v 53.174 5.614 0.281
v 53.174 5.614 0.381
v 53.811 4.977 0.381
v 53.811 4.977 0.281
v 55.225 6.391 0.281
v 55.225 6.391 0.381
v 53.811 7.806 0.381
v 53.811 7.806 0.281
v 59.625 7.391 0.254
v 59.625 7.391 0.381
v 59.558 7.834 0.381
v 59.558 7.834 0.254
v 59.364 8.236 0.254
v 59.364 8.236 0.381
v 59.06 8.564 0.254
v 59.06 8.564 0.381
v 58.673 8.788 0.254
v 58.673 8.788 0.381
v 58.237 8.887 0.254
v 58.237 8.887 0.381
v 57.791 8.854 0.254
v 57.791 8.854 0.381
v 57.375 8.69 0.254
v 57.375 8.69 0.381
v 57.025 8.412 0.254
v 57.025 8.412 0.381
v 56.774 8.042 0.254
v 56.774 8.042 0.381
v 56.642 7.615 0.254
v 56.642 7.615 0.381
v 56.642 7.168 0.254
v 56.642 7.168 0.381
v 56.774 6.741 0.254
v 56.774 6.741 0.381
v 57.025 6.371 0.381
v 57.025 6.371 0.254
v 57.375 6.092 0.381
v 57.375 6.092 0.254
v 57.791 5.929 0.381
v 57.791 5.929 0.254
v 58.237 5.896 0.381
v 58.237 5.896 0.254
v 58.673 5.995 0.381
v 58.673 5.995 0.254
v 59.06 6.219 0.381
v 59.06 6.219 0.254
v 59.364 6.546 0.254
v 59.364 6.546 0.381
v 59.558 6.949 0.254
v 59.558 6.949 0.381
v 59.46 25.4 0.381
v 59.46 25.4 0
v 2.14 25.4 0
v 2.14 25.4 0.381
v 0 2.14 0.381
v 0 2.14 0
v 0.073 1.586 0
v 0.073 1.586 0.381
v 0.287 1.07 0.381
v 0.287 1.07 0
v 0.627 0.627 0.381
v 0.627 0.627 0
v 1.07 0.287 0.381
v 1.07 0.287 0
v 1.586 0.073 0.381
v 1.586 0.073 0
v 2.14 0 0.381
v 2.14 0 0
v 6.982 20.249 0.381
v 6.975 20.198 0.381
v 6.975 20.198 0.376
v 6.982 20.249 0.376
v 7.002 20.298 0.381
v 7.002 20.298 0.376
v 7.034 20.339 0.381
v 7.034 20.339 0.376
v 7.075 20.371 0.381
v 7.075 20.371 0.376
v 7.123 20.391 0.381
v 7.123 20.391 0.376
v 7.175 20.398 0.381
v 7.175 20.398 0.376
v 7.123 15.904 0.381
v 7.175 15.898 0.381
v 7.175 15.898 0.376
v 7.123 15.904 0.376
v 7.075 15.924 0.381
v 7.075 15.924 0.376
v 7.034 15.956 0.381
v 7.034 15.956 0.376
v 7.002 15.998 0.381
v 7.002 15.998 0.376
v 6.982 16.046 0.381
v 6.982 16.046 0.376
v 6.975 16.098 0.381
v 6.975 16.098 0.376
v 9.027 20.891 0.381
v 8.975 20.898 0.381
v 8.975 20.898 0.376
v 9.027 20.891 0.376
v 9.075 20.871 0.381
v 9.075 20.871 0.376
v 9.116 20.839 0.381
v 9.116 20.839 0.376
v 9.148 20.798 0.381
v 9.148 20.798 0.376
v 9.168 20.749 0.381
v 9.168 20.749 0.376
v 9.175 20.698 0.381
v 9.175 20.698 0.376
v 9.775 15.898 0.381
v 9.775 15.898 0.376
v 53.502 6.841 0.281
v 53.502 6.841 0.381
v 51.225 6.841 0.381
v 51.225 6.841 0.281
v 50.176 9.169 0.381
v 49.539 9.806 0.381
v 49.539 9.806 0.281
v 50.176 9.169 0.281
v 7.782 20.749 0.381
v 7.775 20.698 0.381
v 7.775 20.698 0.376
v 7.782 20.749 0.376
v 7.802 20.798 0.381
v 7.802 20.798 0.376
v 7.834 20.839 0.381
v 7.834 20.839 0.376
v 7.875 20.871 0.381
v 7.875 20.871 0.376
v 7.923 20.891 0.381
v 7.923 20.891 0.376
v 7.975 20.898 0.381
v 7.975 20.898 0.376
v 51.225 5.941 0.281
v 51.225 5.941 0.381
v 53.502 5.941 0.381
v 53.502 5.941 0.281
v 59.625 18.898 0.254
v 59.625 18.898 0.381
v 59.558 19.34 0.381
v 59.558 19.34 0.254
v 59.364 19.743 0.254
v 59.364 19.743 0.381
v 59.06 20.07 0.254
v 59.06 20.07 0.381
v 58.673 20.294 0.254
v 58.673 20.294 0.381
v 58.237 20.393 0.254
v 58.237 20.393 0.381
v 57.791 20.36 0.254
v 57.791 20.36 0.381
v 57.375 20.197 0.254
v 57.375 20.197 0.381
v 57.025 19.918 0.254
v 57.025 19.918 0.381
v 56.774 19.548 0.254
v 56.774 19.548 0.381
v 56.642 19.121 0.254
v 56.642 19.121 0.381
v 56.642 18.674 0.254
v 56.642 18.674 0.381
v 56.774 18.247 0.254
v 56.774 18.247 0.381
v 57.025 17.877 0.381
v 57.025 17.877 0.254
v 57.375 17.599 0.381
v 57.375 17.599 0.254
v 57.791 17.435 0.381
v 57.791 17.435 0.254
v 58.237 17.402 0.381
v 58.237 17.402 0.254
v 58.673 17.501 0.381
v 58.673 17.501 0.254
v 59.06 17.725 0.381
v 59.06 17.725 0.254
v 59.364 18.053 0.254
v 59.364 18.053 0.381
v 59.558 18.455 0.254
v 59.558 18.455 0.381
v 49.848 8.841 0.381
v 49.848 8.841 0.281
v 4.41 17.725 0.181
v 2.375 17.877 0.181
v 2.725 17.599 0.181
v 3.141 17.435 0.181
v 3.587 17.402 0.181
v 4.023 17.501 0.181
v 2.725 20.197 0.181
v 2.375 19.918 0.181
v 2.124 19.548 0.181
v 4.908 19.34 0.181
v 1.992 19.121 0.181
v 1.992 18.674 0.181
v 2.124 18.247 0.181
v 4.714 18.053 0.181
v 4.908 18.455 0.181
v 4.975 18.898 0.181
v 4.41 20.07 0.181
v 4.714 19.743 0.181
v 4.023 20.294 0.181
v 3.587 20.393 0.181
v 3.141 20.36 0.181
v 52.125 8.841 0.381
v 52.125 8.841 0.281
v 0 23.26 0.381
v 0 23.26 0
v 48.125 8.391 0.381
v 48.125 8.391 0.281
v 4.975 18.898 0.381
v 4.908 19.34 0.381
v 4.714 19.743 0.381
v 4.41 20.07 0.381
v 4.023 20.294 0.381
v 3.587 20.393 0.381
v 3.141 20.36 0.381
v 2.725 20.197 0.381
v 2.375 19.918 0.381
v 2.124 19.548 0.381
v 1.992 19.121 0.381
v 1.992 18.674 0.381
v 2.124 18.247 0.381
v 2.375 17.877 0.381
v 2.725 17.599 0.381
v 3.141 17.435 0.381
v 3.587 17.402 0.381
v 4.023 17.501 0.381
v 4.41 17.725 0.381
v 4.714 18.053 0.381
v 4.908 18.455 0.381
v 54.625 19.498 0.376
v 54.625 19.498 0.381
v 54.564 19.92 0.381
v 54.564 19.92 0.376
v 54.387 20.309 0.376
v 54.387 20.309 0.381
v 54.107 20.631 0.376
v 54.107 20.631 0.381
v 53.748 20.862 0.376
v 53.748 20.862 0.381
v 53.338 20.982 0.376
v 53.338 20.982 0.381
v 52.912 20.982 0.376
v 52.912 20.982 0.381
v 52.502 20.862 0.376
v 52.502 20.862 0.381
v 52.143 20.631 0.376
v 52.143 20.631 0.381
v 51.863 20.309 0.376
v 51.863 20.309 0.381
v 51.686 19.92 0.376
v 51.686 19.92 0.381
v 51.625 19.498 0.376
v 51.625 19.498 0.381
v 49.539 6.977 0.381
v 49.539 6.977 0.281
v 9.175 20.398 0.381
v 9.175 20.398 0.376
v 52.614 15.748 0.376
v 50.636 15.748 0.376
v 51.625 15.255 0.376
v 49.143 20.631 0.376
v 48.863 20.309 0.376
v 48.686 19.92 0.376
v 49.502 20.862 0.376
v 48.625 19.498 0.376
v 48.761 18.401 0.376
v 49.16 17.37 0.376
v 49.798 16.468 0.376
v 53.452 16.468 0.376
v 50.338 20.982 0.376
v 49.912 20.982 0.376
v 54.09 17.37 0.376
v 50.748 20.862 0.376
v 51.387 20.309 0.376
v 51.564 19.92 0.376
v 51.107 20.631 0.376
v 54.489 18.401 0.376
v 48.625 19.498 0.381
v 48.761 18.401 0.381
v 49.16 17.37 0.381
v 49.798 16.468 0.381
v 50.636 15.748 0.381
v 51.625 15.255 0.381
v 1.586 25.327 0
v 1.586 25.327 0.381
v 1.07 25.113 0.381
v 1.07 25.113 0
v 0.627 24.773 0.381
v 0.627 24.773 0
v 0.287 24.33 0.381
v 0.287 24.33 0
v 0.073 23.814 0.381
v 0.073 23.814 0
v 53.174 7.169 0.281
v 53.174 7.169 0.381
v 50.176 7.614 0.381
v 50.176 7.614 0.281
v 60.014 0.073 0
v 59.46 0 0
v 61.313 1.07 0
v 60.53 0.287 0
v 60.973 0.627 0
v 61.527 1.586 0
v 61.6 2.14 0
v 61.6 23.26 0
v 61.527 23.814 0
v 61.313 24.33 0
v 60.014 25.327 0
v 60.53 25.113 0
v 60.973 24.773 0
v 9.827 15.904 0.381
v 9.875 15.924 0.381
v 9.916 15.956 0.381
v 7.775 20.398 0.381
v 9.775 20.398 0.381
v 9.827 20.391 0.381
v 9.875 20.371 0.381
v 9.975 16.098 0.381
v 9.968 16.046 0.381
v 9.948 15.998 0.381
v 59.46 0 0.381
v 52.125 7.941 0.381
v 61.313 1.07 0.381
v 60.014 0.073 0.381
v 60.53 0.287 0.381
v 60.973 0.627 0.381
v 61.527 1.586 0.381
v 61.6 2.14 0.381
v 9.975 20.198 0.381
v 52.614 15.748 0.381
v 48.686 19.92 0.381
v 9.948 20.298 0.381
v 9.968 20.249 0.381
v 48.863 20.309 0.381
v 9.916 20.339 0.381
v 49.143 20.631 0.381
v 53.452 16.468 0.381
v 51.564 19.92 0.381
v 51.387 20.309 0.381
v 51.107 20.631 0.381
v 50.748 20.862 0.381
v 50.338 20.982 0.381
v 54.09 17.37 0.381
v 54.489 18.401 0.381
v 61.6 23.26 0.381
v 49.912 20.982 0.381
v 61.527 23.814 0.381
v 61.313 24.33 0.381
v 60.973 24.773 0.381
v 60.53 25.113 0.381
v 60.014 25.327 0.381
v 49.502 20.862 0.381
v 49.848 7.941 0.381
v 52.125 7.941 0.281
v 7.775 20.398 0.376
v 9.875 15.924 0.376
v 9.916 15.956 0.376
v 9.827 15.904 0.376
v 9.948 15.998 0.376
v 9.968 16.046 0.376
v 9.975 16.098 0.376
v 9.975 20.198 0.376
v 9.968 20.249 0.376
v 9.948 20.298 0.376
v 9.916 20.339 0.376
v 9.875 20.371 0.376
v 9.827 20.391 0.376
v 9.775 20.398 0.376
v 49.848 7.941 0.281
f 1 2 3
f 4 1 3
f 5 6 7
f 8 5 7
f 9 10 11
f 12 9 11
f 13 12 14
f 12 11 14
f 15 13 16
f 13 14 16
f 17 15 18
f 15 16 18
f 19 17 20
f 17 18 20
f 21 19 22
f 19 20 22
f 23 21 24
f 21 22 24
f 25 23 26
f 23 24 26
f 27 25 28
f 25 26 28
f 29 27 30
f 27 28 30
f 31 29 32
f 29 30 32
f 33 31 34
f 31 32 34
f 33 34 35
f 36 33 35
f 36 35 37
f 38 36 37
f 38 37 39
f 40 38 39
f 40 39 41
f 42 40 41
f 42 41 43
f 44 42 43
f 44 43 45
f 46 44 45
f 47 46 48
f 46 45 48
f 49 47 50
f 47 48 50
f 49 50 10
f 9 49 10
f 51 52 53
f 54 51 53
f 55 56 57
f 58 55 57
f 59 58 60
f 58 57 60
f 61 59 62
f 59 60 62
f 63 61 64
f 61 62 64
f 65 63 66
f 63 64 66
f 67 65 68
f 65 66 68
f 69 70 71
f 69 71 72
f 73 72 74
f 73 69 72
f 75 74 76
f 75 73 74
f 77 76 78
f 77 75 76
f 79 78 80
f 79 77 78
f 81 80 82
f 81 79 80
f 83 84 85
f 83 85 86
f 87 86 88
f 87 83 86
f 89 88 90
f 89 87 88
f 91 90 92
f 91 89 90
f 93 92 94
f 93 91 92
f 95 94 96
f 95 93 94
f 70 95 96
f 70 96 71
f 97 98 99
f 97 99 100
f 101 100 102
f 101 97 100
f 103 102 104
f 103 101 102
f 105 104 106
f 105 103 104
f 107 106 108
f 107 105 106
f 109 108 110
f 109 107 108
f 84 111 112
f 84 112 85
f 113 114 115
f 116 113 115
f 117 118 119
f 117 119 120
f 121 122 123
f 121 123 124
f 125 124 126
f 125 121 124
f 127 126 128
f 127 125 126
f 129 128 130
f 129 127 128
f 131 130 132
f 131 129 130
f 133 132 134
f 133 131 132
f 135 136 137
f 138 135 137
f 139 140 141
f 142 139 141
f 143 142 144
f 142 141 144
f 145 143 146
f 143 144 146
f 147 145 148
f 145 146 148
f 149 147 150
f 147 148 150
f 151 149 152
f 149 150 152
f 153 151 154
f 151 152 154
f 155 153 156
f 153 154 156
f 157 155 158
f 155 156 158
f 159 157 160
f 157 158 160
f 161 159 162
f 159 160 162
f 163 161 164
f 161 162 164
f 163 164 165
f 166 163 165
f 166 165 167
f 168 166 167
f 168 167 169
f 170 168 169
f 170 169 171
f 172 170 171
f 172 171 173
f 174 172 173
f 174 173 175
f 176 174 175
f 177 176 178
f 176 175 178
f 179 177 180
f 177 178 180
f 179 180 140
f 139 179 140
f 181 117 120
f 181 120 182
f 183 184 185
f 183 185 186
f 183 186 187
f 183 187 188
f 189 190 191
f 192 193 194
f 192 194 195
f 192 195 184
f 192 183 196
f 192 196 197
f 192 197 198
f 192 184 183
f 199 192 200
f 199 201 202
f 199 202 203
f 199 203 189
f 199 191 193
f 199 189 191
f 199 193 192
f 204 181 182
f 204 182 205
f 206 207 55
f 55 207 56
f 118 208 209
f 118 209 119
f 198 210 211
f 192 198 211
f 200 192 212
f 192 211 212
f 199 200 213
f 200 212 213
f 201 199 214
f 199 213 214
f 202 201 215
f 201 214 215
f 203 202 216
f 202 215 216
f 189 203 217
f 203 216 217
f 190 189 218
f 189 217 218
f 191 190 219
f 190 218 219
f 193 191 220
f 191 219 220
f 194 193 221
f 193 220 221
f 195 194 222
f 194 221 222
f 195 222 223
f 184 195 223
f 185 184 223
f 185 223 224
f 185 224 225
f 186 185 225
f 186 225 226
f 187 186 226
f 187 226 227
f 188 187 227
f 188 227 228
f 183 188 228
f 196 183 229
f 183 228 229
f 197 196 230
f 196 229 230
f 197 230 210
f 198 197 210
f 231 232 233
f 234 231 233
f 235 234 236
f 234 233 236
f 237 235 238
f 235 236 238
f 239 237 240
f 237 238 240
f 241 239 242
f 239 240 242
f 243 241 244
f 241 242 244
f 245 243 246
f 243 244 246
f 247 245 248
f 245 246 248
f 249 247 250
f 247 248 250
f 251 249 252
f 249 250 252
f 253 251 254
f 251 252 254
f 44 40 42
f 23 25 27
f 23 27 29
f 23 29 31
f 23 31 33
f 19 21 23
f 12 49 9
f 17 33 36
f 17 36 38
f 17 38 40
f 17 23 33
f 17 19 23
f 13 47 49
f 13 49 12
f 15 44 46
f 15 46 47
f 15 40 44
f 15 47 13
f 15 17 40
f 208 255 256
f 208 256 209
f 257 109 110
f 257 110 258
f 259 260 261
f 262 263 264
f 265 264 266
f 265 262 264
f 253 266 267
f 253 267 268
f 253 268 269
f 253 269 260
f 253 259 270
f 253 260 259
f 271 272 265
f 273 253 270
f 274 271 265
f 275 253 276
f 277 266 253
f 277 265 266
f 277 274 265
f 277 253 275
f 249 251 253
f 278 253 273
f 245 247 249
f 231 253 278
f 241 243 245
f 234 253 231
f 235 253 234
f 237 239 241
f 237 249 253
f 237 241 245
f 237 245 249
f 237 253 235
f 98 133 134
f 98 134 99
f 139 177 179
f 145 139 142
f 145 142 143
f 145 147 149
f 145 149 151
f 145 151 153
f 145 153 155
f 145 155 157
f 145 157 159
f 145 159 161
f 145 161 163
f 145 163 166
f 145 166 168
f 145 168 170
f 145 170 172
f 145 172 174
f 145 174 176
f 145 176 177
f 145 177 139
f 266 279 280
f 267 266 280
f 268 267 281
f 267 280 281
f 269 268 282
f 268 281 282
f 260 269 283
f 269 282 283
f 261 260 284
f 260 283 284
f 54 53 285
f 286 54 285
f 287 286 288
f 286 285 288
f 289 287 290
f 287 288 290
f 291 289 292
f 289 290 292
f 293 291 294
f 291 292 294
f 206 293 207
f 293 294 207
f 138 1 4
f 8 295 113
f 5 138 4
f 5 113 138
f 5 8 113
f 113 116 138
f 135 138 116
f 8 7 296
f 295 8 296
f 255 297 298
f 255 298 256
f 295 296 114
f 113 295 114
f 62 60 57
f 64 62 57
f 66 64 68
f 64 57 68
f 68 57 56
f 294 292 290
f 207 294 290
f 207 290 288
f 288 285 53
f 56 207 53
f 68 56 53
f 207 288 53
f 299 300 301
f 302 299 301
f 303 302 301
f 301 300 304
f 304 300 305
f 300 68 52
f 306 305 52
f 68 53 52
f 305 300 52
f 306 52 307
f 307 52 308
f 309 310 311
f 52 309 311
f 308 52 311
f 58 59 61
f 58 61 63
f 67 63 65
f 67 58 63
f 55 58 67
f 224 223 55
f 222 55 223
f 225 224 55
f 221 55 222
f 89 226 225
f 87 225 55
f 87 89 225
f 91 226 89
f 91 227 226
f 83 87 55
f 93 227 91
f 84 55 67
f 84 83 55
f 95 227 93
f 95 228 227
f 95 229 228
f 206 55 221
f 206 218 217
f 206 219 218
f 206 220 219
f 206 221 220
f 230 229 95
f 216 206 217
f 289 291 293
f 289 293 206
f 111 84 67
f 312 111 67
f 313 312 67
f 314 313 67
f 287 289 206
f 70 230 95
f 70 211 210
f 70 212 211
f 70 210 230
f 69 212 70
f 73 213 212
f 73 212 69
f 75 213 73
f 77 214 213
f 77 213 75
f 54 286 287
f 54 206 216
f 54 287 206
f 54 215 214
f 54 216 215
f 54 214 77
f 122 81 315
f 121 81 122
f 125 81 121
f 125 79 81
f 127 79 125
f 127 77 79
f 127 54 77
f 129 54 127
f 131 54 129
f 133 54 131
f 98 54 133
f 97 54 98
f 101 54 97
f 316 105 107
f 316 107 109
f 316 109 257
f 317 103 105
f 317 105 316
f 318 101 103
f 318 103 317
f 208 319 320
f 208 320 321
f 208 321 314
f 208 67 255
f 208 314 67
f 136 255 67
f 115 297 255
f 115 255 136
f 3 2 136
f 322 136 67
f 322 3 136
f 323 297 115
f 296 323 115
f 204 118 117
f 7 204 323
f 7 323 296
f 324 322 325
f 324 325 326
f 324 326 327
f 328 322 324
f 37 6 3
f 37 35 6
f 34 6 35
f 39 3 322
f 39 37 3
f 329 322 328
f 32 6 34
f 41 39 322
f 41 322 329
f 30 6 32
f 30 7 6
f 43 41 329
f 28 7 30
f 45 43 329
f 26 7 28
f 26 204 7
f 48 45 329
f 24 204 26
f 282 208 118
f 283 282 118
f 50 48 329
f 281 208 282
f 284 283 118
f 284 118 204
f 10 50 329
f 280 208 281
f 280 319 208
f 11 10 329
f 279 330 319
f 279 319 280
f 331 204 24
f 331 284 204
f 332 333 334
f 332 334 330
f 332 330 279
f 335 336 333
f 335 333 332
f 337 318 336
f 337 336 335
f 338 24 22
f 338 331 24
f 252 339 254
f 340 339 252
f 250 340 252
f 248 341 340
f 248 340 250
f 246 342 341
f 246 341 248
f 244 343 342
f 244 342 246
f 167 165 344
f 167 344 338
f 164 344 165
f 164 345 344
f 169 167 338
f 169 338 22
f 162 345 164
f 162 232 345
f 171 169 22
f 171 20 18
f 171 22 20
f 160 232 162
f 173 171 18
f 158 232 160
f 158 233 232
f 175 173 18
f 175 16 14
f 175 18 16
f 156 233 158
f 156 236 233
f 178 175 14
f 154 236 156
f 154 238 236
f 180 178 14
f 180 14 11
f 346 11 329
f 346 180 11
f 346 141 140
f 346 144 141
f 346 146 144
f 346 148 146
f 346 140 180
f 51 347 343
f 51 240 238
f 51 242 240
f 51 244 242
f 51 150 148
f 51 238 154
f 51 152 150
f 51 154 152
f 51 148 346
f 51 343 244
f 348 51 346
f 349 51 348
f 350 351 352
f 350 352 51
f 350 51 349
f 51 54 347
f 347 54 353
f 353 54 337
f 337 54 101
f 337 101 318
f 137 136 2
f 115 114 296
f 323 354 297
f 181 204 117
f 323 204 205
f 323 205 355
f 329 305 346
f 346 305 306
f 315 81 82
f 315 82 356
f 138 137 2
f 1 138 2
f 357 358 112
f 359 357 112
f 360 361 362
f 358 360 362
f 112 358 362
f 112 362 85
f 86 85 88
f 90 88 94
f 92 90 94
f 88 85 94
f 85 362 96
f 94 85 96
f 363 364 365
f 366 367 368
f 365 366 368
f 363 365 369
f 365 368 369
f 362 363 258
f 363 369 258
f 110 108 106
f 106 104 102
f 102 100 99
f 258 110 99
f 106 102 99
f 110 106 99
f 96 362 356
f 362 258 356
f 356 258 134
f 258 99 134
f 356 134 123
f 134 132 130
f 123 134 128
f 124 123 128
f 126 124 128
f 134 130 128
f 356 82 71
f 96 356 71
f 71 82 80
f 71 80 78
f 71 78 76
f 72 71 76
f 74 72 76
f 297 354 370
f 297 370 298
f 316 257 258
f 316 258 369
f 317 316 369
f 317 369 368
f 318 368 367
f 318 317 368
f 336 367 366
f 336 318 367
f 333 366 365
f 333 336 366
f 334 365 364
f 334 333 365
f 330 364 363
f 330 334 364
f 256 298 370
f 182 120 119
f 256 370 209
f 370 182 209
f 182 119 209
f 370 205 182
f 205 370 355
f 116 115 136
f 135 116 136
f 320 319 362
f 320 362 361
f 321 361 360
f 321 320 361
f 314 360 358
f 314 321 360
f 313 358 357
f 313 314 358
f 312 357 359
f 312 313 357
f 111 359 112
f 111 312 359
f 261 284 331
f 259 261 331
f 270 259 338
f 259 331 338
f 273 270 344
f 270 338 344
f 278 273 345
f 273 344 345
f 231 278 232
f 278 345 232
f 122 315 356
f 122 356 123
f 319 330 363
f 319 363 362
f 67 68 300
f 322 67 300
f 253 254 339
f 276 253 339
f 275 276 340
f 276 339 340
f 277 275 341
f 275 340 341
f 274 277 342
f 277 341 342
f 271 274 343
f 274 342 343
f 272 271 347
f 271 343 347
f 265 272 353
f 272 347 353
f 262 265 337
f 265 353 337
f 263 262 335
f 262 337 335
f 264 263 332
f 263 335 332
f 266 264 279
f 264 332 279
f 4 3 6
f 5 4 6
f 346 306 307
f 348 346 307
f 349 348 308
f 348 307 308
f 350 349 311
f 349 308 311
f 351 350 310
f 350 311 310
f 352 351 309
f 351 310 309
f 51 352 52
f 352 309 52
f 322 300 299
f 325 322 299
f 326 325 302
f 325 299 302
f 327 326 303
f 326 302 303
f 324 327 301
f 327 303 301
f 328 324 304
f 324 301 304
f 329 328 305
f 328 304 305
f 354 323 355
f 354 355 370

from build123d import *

# Parameters (mm, degrees)
BOSS_EXTRUDE1_DEPTH          = 0.381
SKETCH2_R                    = 1.5
CUT_EXTRUDE1_DEPTH           = 0.127
SKETCH17_R                   = 1.5
CUT_EXTRUDE9_DEPTH           = 0.2
HEART_SYM_CUT_EXTRUDE6_DEPTH = 0.005
BATT_SYM_CUT_EXTRUDE7_DEPTH  = 0.005
COMM_SYMCUT_EXTRUDE9_DEPTH   = 0.1


with BuildPart() as part:
    # Sketch1 → Boss-Extrude1 (new body)
    with BuildSketch(Plane.XY):
        with BuildLine():
            Line((2.14, 0), (59.46, 0))
            ThreePointArc((59.46, 0), (60.973208512, 0.626791488), (61.6, 2.14))
            Line((61.6, 2.14), (61.6, 23.26))
            ThreePointArc((61.6, 23.26), (60.973208512, 24.773208512), (59.46, 25.4))
            Line((59.46, 25.4), (2.14, 25.4))
            ThreePointArc((2.14, 25.4), (0.626791488, 24.773208512), (0, 23.26))
            Line((0, 23.26), (0, 2.14))
            ThreePointArc((0, 2.14), (0.626791488, 0.626791488), (2.14, 0))
        make_face()
    extrude(amount=BOSS_EXTRUDE1_DEPTH)

    # Sketch2 → Cut-Extrude1 (cut)
    with BuildSketch(Plane.XY.offset(0.381)):
        with Locations((58.125, 18.8976)):
            Circle(SKETCH2_R)
        with Locations((58.125, 7.3914)):
            Circle(SKETCH2_R)
    extrude(amount=-CUT_EXTRUDE1_DEPTH, mode=Mode.SUBTRACT)

    # Sketch17 → Cut-Extrude9 (cut)
    with BuildSketch(Plane.XY.offset(0.381)):
        with Locations((3.475, 18.8976)):
            Circle(SKETCH17_R)
    extrude(amount=-CUT_EXTRUDE9_DEPTH, mode=Mode.SUBTRACT)

    # Sketch10 → Heart Sym Cut-Extrude6 (cut)
    with BuildSketch(Plane.XY.offset(0.381)):
        with BuildLine():
            ThreePointArc((51.625, 19.4976), (50.125, 20.9976), (48.625, 19.4976))
            ThreePointArc((48.625, 19.4976), (49.450765386, 16.899523789), (51.625, 15.254959313))
            ThreePointArc((51.625, 15.254959313), (53.799234614, 16.899523789), (54.625, 19.4976))
            ThreePointArc((54.625, 19.4976), (53.125, 20.9976), (51.625, 19.4976))
        make_face()
    extrude(amount=-HEART_SYM_CUT_EXTRUDE6_DEPTH, mode=Mode.SUBTRACT)

    # Sketch11 → Batt Sym Cut-Extrude7 (cut)
    with BuildSketch(Plane.XY.offset(0.381)):
        with BuildLine():
            Line((7.175, 20.3976), (7.775, 20.3976))
            Line((7.775, 20.3976), (7.775, 20.6976))
            ThreePointArc((7.775, 20.6976), (7.833578644, 20.839021356), (7.975, 20.8976))
            Line((7.975, 20.8976), (8.975, 20.8976))
            ThreePointArc((8.975, 20.8976), (9.116421356, 20.839021356), (9.175, 20.6976))
            Line((9.175, 20.6976), (9.175, 20.3976))
            Line((9.175, 20.3976), (9.775, 20.3976))
            ThreePointArc((9.775, 20.3976), (9.916421356, 20.339021356), (9.975, 20.1976))
            Line((9.975, 20.1976), (9.975, 16.0976))
            ThreePointArc((9.975, 16.0976), (9.916421356, 15.956178644), (9.775, 15.8976))
            Line((9.775, 15.8976), (7.175, 15.8976))
            ThreePointArc((7.175, 15.8976), (7.033578644, 15.956178644), (6.975, 16.0976))
            Line((6.975, 16.0976), (6.975, 20.1976))
            ThreePointArc((6.975, 20.1976), (7.033578644, 20.339021356), (7.175, 20.3976))
        make_face()
    extrude(amount=-BATT_SYM_CUT_EXTRUDE7_DEPTH, mode=Mode.SUBTRACT)

    # Sketch13 → Comm SymCut-Extrude9 (cut)
    with BuildSketch(Plane.XY.offset(0.381)):
        Polygon((53.810786438, 7.805613562), (53.174390335, 7.169217459), (53.502207794, 6.8414), (51.225, 6.8414), (51.225, 5.9414), (53.502207794, 5.9414), (53.174390335, 5.613582541), (53.810786438, 4.977186438), (55.225, 6.3914), align=None)
        Polygon((49.847792206, 7.9414), (50.175609665, 7.613582541), (49.539213562, 6.977186438), (48.125, 8.3914), (49.539213562, 9.805613562), (50.175609665, 9.169217459), (49.847792206, 8.8414), (52.125, 8.8414), (52.125, 7.9414), align=None)
    extrude(amount=-COMM_SYMCUT_EXTRUDE9_DEPTH, mode=Mode.SUBTRACT)


solid = part.part
